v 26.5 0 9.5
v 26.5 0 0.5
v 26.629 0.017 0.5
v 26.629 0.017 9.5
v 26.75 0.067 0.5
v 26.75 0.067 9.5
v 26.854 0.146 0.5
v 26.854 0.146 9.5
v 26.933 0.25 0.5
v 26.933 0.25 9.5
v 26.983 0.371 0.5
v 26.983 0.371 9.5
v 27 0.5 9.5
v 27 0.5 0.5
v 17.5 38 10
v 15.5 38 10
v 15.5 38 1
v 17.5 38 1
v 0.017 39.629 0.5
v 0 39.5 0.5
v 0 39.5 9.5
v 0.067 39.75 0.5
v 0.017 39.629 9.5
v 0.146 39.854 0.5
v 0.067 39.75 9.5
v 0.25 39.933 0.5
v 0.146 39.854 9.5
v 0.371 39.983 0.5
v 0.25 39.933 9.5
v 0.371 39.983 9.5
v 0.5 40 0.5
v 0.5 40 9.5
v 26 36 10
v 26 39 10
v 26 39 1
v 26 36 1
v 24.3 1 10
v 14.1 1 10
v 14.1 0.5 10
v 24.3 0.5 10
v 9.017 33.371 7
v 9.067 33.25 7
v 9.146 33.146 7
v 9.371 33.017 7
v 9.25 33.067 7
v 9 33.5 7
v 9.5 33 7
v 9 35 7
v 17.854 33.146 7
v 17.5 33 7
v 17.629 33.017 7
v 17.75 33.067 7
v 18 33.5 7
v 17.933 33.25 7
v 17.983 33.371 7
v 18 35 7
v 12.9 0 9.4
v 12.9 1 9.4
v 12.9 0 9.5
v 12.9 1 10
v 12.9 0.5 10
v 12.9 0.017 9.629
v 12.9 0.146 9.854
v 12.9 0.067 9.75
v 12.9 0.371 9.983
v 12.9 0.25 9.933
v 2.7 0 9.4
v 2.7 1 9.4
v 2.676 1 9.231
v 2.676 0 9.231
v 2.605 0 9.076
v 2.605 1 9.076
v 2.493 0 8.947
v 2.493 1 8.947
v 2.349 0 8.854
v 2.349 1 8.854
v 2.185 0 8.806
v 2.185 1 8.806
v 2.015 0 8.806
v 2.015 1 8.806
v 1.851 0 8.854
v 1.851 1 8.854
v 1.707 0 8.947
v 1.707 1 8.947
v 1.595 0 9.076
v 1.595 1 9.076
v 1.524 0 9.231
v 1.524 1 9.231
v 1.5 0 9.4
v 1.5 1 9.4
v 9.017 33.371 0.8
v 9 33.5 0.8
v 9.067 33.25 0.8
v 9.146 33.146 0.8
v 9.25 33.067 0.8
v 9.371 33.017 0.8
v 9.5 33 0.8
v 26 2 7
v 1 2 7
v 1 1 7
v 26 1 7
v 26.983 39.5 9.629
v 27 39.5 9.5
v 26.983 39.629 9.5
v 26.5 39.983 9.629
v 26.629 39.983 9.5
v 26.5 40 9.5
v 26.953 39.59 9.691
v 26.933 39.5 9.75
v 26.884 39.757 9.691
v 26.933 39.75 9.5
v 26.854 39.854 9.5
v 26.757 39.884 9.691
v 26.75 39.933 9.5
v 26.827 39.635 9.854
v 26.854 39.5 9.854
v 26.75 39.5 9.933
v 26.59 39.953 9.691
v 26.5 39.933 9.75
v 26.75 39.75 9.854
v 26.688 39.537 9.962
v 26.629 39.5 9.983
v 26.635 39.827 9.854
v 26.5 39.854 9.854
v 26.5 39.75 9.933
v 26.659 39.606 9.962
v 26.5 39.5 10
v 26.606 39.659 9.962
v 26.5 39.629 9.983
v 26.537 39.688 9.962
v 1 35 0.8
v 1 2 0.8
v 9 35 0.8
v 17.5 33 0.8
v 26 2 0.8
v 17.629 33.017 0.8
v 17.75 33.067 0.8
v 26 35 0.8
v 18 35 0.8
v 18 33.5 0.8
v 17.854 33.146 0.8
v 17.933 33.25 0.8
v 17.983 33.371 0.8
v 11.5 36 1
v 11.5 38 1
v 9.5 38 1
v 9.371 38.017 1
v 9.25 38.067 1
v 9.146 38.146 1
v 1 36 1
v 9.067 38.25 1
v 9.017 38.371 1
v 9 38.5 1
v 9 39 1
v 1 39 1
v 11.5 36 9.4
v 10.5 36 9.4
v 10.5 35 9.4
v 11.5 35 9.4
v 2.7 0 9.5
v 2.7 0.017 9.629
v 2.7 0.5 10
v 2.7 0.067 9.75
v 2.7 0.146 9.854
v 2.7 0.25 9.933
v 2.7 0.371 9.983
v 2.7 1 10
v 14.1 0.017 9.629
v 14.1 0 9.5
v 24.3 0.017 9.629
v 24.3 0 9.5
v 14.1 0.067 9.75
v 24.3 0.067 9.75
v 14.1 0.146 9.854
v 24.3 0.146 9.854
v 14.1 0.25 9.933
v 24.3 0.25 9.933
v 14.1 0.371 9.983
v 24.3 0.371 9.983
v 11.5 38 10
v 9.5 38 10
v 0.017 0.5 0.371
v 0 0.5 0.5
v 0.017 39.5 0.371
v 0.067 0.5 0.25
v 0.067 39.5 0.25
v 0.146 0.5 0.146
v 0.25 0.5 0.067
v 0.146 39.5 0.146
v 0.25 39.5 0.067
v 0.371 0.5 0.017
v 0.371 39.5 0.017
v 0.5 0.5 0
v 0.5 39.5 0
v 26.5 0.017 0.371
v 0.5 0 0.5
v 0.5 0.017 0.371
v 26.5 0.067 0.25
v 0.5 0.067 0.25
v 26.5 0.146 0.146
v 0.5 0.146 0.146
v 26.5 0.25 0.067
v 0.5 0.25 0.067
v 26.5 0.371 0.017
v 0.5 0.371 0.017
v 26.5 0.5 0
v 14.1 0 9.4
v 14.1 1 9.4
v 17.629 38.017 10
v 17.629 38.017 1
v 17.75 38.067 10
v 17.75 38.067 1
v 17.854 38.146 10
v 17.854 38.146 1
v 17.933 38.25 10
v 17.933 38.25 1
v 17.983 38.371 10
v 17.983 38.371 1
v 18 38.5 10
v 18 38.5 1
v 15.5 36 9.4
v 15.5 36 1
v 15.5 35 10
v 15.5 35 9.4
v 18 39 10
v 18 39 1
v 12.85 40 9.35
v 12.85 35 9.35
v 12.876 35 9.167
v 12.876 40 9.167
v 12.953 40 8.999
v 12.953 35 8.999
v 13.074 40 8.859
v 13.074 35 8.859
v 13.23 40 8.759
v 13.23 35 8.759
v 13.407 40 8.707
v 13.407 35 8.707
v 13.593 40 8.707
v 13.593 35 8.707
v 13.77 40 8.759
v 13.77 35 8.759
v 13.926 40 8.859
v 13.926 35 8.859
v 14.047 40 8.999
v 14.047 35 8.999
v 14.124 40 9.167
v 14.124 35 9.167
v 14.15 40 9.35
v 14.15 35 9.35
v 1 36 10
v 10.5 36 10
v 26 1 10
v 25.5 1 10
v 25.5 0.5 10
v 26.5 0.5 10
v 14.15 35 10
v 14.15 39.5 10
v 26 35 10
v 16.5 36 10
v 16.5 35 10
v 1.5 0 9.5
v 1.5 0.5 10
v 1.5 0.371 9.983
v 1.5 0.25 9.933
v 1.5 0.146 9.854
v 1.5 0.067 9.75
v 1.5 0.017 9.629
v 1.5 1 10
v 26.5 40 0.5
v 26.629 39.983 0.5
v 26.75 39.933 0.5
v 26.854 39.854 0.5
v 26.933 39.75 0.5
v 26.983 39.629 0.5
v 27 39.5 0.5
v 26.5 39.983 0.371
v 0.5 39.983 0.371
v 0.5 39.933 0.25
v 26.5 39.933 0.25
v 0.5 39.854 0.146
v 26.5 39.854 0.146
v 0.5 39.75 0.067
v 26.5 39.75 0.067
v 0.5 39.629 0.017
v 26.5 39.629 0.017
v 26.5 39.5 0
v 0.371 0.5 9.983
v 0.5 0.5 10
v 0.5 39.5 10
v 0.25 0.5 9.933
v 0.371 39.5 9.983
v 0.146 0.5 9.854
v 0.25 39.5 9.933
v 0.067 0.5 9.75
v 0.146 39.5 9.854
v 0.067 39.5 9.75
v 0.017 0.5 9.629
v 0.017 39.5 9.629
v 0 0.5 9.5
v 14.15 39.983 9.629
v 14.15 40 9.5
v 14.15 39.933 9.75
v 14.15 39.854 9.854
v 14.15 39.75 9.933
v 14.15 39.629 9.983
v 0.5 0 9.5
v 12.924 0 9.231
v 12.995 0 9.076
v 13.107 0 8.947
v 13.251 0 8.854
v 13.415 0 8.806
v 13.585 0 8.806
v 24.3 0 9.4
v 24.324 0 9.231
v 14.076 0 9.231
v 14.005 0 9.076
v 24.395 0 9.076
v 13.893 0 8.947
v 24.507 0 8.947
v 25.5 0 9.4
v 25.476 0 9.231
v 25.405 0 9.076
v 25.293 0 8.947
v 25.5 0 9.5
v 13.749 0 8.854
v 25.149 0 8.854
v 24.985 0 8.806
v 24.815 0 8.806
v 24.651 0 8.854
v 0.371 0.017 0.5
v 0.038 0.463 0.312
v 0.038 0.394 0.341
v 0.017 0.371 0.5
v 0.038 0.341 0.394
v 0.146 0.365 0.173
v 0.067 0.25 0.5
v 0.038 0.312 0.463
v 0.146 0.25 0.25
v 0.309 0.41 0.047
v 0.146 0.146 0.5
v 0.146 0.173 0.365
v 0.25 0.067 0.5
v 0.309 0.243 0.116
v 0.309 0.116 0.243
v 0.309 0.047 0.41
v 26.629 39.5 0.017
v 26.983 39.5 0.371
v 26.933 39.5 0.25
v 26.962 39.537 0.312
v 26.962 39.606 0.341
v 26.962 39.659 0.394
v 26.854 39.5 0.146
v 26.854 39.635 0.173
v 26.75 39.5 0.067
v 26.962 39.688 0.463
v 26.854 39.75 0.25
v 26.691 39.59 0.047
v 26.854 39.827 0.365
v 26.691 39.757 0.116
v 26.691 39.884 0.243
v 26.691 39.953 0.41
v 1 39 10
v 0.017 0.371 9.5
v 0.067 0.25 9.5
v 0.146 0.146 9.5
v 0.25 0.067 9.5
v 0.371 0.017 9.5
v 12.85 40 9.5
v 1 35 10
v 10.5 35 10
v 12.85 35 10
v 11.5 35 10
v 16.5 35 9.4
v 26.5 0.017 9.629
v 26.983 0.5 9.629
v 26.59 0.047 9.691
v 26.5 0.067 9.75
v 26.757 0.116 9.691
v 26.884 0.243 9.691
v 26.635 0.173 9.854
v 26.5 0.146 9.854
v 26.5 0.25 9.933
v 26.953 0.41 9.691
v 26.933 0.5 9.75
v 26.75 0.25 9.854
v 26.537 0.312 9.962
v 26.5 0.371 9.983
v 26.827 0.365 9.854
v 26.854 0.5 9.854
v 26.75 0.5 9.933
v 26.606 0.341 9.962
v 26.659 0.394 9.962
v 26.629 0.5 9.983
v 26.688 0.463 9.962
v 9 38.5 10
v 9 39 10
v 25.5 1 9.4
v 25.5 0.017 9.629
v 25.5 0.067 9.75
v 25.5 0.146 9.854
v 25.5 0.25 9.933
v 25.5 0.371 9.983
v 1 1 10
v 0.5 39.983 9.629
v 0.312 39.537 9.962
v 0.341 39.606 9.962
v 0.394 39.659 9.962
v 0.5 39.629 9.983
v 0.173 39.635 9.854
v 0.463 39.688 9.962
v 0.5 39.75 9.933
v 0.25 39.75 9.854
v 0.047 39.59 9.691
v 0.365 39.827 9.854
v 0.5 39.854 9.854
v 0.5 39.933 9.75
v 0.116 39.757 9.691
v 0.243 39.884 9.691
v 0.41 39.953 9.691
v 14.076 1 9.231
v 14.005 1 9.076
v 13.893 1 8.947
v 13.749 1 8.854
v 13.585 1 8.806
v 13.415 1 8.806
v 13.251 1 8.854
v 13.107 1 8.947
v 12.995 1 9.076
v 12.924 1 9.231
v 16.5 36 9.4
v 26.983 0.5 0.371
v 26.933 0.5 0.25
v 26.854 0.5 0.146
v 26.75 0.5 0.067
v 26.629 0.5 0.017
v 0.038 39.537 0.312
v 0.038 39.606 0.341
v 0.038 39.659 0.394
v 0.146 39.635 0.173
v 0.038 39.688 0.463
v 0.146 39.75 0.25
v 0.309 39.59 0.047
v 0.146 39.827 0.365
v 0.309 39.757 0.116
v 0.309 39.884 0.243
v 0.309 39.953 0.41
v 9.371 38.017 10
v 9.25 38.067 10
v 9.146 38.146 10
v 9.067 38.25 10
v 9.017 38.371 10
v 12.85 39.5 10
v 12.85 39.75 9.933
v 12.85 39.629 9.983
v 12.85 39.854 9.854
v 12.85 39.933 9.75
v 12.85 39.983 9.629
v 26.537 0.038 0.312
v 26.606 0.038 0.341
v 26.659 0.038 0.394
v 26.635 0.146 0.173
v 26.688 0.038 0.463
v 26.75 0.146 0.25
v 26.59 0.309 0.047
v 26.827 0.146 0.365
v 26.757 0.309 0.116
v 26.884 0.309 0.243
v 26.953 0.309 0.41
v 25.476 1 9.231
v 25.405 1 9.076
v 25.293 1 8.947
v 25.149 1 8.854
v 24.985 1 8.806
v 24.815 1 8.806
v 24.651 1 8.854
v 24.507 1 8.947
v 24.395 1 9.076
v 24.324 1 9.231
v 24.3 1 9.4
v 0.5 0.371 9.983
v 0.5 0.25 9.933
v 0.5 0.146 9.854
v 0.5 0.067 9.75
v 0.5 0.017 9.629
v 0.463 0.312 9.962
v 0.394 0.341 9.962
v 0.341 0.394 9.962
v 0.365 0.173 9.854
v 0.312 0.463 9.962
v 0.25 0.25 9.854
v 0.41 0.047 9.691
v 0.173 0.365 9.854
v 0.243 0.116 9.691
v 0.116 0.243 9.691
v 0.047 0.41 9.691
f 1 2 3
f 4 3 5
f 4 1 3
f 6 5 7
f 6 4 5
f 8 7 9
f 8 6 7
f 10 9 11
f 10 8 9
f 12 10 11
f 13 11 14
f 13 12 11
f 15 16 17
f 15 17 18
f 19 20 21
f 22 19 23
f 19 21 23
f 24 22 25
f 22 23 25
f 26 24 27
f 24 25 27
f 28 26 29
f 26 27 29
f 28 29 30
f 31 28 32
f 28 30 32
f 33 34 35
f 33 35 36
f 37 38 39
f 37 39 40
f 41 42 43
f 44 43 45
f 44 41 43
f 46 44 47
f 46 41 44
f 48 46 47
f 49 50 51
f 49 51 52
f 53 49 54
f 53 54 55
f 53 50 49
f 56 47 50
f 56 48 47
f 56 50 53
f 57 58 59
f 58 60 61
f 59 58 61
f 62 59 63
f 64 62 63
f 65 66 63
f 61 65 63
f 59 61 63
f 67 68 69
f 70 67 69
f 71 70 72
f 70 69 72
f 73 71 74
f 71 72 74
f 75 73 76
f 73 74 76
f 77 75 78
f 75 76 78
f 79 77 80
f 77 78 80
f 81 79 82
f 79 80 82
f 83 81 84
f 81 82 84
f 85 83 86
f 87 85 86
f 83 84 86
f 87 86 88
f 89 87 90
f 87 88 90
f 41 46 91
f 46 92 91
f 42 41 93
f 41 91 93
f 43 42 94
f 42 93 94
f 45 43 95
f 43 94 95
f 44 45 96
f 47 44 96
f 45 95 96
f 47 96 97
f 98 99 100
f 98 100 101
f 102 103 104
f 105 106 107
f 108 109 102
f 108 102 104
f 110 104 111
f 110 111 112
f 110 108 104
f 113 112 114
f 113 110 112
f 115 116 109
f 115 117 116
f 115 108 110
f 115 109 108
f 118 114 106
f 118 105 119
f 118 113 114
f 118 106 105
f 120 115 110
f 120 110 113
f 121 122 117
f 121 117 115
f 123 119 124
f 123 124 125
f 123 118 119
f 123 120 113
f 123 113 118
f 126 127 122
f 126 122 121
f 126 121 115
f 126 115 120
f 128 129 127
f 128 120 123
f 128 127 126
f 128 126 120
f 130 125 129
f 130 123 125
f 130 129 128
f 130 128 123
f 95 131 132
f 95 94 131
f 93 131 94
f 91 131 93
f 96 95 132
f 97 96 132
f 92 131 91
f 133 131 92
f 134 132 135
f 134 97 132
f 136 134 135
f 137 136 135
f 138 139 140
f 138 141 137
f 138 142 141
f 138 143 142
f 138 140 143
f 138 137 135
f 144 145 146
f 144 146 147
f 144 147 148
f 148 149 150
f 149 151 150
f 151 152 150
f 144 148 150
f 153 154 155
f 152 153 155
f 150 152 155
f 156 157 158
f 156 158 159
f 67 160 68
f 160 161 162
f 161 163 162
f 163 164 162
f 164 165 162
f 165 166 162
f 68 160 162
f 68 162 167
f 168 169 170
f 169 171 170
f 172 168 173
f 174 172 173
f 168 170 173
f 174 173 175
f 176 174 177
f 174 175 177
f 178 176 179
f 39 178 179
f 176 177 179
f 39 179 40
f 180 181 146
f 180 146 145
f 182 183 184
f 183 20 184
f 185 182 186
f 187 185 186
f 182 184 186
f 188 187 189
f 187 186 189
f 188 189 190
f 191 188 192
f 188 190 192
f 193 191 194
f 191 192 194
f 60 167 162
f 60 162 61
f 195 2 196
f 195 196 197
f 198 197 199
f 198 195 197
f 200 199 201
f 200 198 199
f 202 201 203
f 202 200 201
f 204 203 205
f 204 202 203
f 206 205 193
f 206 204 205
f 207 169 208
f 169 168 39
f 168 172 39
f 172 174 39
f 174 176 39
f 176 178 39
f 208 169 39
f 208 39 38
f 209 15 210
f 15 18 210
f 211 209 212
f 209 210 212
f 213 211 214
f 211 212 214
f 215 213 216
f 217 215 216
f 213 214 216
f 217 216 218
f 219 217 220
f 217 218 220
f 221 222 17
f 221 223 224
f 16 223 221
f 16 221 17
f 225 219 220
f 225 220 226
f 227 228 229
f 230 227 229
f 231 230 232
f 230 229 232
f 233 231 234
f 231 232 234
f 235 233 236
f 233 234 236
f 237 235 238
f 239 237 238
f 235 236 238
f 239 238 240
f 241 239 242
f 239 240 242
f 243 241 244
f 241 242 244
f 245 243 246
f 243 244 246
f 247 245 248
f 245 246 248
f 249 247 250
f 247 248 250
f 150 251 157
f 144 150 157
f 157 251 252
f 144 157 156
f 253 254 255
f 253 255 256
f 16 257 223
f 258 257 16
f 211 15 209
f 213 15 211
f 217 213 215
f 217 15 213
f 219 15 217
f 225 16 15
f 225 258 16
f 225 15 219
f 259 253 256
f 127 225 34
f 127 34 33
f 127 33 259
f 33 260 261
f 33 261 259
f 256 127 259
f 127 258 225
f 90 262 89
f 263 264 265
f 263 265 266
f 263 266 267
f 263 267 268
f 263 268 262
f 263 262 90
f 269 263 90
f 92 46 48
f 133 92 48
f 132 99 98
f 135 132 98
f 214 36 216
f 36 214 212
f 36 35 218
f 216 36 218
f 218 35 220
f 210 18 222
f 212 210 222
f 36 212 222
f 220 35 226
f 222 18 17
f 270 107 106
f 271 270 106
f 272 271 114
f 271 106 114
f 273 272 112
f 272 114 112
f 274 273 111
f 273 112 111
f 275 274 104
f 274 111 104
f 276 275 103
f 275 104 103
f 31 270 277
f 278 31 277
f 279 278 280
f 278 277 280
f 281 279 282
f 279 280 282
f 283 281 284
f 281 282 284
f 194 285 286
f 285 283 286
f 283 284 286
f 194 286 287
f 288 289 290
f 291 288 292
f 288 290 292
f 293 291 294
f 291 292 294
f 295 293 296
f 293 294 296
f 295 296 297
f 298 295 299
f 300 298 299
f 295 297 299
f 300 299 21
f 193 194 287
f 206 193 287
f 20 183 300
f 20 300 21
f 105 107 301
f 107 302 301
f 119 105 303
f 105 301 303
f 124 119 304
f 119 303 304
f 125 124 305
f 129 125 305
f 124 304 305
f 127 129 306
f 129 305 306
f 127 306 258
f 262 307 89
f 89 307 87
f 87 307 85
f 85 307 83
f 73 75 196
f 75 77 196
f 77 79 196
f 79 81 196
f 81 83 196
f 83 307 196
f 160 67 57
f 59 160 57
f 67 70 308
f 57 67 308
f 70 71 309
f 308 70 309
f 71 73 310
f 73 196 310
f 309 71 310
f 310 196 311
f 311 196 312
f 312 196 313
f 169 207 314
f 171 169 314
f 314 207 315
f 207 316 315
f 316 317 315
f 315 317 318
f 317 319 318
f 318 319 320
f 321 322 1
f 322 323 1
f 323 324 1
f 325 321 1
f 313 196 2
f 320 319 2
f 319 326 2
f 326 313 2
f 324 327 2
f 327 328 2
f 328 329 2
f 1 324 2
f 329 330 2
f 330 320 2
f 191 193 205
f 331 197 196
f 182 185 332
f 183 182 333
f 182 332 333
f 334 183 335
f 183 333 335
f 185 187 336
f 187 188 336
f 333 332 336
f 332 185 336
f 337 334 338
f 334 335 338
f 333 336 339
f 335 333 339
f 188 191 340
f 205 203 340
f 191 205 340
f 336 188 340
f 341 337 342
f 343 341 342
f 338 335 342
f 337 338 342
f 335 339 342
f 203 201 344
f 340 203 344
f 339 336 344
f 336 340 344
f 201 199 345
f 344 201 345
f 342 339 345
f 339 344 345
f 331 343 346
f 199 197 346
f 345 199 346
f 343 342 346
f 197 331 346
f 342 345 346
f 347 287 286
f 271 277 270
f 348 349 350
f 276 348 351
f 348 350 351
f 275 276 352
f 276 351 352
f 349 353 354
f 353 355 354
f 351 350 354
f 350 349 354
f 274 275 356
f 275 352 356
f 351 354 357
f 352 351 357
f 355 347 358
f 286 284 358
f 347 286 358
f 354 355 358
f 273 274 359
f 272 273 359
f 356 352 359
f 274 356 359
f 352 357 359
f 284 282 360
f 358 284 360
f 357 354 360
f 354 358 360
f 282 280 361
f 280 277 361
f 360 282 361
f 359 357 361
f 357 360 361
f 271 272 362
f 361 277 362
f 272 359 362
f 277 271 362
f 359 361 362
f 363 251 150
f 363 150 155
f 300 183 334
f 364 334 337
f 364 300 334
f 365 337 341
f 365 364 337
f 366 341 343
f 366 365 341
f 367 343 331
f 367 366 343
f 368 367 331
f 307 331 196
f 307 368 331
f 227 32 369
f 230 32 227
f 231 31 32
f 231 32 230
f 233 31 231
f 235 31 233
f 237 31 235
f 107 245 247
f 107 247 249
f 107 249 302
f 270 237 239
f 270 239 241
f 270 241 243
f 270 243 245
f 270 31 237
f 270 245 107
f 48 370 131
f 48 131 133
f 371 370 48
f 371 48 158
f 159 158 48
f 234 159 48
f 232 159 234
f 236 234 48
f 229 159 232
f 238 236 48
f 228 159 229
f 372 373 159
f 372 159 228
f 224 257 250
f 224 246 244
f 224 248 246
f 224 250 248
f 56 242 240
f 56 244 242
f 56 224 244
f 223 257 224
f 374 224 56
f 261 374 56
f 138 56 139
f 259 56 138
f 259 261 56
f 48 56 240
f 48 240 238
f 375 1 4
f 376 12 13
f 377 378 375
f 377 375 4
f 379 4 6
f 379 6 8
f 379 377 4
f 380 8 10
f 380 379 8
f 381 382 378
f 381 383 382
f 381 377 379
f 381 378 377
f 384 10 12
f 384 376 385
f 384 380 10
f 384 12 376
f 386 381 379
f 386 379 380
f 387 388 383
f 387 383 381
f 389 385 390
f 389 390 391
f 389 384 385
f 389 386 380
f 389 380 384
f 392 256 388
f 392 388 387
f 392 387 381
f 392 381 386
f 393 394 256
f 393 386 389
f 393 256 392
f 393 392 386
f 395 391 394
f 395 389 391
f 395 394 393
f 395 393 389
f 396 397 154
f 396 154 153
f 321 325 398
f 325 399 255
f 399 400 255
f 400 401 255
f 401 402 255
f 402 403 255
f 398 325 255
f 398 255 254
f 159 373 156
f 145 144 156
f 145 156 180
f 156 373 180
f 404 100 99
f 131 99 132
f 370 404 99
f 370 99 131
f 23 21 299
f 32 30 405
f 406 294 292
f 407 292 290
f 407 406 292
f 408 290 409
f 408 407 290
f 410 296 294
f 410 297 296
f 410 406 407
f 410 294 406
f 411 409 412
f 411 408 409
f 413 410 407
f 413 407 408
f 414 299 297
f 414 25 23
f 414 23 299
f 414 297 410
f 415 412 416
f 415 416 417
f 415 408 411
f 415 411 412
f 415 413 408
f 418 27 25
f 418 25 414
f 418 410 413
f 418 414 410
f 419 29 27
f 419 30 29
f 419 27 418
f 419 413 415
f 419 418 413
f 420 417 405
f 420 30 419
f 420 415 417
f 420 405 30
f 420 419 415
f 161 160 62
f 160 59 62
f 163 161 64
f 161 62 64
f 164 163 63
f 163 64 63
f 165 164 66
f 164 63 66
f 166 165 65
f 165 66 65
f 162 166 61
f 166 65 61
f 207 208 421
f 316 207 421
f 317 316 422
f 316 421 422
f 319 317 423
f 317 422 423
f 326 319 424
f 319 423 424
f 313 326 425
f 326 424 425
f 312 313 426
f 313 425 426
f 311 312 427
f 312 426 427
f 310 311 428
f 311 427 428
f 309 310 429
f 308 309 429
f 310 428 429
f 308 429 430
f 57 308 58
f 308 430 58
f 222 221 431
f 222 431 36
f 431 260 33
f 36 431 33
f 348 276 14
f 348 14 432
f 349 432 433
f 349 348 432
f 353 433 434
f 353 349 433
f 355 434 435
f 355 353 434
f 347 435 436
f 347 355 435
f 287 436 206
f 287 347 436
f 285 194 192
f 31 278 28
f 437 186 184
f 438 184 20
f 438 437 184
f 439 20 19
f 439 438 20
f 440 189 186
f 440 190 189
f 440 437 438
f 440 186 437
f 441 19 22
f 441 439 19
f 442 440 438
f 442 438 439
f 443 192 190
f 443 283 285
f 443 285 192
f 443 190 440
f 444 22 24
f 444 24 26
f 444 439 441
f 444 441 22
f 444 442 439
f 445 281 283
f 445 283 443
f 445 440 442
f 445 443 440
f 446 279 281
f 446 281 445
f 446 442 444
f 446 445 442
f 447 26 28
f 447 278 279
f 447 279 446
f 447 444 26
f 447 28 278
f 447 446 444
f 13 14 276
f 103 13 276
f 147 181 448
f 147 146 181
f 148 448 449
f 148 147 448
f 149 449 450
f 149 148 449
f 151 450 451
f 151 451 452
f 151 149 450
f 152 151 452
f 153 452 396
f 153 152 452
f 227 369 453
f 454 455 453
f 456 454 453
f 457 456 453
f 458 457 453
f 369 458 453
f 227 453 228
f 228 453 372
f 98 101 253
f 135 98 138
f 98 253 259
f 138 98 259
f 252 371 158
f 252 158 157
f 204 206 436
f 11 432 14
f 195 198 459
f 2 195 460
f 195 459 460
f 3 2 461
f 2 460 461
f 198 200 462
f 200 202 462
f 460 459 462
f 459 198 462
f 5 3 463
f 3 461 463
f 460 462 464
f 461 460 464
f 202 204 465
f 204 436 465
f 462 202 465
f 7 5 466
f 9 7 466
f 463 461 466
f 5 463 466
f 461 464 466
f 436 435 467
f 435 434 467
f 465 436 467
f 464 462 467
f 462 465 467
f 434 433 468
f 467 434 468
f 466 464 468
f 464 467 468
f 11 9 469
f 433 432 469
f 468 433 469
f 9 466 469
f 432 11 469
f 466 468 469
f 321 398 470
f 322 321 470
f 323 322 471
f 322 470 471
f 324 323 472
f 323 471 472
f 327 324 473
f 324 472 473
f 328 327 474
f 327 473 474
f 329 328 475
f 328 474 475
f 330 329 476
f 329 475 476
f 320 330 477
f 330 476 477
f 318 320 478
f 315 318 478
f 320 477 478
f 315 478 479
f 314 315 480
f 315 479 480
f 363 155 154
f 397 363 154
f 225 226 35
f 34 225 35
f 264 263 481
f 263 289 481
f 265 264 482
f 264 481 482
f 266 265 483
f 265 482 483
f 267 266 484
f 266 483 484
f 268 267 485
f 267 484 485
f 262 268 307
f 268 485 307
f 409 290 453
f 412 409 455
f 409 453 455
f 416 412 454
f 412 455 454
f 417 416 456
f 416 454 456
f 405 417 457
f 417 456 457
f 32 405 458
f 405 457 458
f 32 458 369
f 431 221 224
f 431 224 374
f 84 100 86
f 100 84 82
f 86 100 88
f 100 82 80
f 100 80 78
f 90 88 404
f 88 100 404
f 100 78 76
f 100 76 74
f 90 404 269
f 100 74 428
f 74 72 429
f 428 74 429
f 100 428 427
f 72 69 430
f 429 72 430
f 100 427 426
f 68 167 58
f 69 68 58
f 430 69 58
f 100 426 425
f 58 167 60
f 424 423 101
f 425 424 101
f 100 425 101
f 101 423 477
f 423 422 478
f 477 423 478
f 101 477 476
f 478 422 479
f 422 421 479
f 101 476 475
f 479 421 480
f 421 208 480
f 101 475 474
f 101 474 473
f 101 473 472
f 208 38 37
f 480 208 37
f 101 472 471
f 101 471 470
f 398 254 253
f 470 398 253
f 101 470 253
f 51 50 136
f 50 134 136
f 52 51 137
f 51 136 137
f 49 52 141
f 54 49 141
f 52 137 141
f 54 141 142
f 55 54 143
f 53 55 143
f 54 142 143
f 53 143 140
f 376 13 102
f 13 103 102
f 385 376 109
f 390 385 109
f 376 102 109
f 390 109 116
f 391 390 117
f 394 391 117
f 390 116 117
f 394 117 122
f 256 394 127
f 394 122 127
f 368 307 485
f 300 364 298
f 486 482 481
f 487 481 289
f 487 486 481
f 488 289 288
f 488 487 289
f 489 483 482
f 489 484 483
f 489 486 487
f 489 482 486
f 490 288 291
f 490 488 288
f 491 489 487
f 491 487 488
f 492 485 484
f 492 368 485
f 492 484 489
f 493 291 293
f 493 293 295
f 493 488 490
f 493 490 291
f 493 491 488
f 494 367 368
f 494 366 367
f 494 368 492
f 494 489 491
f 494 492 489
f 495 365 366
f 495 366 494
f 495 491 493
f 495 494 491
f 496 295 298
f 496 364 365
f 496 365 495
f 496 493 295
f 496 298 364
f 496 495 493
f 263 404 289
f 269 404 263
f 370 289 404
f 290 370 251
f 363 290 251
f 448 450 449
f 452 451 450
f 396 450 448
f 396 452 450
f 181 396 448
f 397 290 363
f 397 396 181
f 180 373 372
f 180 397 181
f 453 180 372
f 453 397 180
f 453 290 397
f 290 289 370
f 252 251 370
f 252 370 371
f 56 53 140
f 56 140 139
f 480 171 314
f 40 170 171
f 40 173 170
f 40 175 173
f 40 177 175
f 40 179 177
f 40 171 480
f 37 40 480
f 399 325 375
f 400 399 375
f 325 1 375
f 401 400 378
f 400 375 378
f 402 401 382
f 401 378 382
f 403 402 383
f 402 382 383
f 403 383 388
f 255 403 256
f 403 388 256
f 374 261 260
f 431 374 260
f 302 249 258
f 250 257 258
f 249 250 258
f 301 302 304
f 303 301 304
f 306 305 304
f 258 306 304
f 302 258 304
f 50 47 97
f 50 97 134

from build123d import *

# Parameters (mm, degrees)
SKETCH_1_W           = 27
SKETCH_1_H           = 40
EXTRUDE_1_DEPTH      = 10
SKETCH_2_W           = 25
SKETCH_2_H           = 31
CUT_EXTRUDE_1_DEPTH  = 9.2
CUT_EXTRUDE_2_DEPTH  = 9
SKETCH_8_W           = 25
SKETCH_8_H           = 2
SKETCH_8_H_2         = 1
CUT_EXTRUDE_7_DEPTH  = 3
SKETCH_9_W           = 8
SKETCH_9_H           = 2
CUT_EXTRUDE_8_DEPTH  = 6.2
CUT_EXTRUDE_9_DEPTH  = 0.65
SKETCH_10_3_W        = 1.2
SKETCH_10_3_H        = 1
CUT_EXTRUDE_10_DEPTH = 0.6
SKETCH_11_R          = 0.65
CUT_EXTRUDE_11_DEPTH = 6
SKETCH_12_R          = 0.6
CUT_EXTRUDE_12_DEPTH = 2
SKETCH_13_W          = 1
SKETCH_13_H          = 1
CUT_EXTRUDE_13_DEPTH = 0.6
FILLET_1_R           = 0.5
FILLET_2_R           = 0.5
FILLET_4_R           = 0.5
FILLET_5_R           = 0.5


with BuildPart() as part:
    # Sketch 1 → Extrude 1 (new body)
    with BuildSketch(Plane.XY):
        with Locations((13.5, 20)):
            Rectangle(SKETCH_1_W, SKETCH_1_H)
    extrude(amount=EXTRUDE_1_DEPTH)

    # Sketch 2 → Cut-Extrude 1 (cut)
    with BuildSketch(Plane.XY.offset(10)):
        with Locations((13.5, 17.5)):
            Rectangle(SKETCH_2_W, SKETCH_2_H)
    extrude(amount=-CUT_EXTRUDE_1_DEPTH, mode=Mode.SUBTRACT)

    # Sketch 3 → Cut-Extrude 2 (cut)
    with BuildSketch(Plane.XY.offset(10)):
        Polygon((1, 39), (9, 39), (9, 38), (11.5, 38), (11.5, 36), (9, 36), (1, 36), align=None)
        Polygon((15.5, 36), (15.5, 38), (18, 38), (18, 39), (26, 39), (26, 36), (18, 36), align=None)
    extrude(amount=-CUT_EXTRUDE_2_DEPTH, mode=Mode.SUBTRACT)

    # Sketch 8 → Cut-Extrude 7 (cut)
    with BuildSketch(Plane.XY.offset(10)):
        with Locations((13.5, 34)):
            Rectangle(SKETCH_8_W, SKETCH_8_H)
        with Locations((13.5, 1.5)):
            Rectangle(SKETCH_8_W, SKETCH_8_H_2)
    extrude(amount=-CUT_EXTRUDE_7_DEPTH, mode=Mode.SUBTRACT)

    # Sketch 9 → Cut-Extrude 8 (cut)
    with BuildSketch(Plane.XY.offset(7)):
        with Locations((5, 34)):
            Rectangle(SKETCH_9_W, SKETCH_9_H)
        with Locations((22, 34)):
            Rectangle(SKETCH_9_W, SKETCH_9_H)
    extrude(amount=-CUT_EXTRUDE_8_DEPTH, mode=Mode.SUBTRACT)

    # Sketch 10 → Cut-Extrude 9 (cut)
    with BuildSketch(Plane.XY.offset(10)):
        Polygon((14.15, 40), (13.5, 40), (12.85, 40), (12.85, 35), (13.5, 35), (14.15, 35), align=None)
    extrude(amount=-CUT_EXTRUDE_9_DEPTH, mode=Mode.SUBTRACT)

    # Sketch 10_3 → Cut-Extrude 10 (cut)
    with BuildSketch(Plane.XY.offset(10)):
        Polygon((12.9, 0), (13.5, 0), (14.1, 0), (14.1, 1), (13.5, 1), (12.9, 1), align=None)
        with Locations((2.1, 0.5)):
            Rectangle(SKETCH_10_3_W, SKETCH_10_3_H)
        with Locations((24.9, 0.5)):
            Rectangle(SKETCH_10_3_W, SKETCH_10_3_H)
    extrude(amount=-CUT_EXTRUDE_10_DEPTH, mode=Mode.SUBTRACT)

    # Sketch 11 → Cut-Extrude 11 (cut, through all)
    with BuildSketch(Plane.XZ.offset(-35)):
        with Locations((13.5, 9.35)):
            Circle(SKETCH_11_R)
    extrude(amount=-CUT_EXTRUDE_11_DEPTH, mode=Mode.SUBTRACT)

    # Sketch 12 → Cut-Extrude 12 (cut, through all)
    with BuildSketch(Plane(origin=(0, 1, 0), x_dir=(1, 0, 0), z_dir=(0, 1, 0))):
        with Locations((13.5, -9.4)):
            Circle(SKETCH_12_R)
        with Locations((24.9, -9.4)):
            Circle(SKETCH_12_R)
        with Locations((2.1, -9.4)):
            Circle(SKETCH_12_R)
    extrude(amount=-CUT_EXTRUDE_12_DEPTH, mode=Mode.SUBTRACT)

    # Sketch 13 → Cut-Extrude 13 (cut)
    with BuildSketch(Plane.XY.offset(10)):
        with Locations((11, 35.5)):
            Rectangle(SKETCH_13_W, SKETCH_13_H)
        with Locations((16, 35.5)):
            Rectangle(SKETCH_13_W, SKETCH_13_H)
    extrude(amount=-CUT_EXTRUDE_13_DEPTH, mode=Mode.SUBTRACT)

    # Fillet 1
    fillet_1_edges = [part.edges().sort_by_distance(p)[0] for p in [
        (18, 33, 3.9),
        (9, 33, 3.9),
    ]]
    fillet(fillet_1_edges, radius=FILLET_1_R)

    # Fillet 2
    fillet_2_edges = [part.edges().sort_by_distance(p)[0] for p in [
        (13.5, 40, 0),
        (27, 20, 0),
        (13.5, 0, 0),
        (0, 20, 0),
        (0, 40, 5),
        (27, 40, 5),
        (27, 0, 5),
        (0, 0, 5),
    ]]
    fillet(fillet_2_edges, radius=FILLET_2_R)

    # Fillet 4
    fillet_4_edges = [part.edges().sort_by_distance(p)[0] for p in [
        (9, 38, 5.5),
        (18, 38, 5.5),
    ]]
    fillet(fillet_4_edges, radius=FILLET_4_R)

    # Fillet 5
    fillet_5_edges = [part.edges().sort_by_distance(p)[0] for p in [
        (6.675, 40, 10),
        (19.2, 0, 10),
        (26, 0, 10),
        (7.8, 0, 10),
        (0, 20, 10),
        (20.325, 40, 10),
        (1, 0, 10),
        (0.146446609, 0.146446609, 10),
        (0.146446609, 39.853553391, 10),
        (27, 20, 10),
        (26.853553391, 0.146446609, 10),
        (26.853553391, 39.853553391, 10),
    ]]
    fillet(fillet_5_edges, radius=FILLET_5_R)


solid = part.part
